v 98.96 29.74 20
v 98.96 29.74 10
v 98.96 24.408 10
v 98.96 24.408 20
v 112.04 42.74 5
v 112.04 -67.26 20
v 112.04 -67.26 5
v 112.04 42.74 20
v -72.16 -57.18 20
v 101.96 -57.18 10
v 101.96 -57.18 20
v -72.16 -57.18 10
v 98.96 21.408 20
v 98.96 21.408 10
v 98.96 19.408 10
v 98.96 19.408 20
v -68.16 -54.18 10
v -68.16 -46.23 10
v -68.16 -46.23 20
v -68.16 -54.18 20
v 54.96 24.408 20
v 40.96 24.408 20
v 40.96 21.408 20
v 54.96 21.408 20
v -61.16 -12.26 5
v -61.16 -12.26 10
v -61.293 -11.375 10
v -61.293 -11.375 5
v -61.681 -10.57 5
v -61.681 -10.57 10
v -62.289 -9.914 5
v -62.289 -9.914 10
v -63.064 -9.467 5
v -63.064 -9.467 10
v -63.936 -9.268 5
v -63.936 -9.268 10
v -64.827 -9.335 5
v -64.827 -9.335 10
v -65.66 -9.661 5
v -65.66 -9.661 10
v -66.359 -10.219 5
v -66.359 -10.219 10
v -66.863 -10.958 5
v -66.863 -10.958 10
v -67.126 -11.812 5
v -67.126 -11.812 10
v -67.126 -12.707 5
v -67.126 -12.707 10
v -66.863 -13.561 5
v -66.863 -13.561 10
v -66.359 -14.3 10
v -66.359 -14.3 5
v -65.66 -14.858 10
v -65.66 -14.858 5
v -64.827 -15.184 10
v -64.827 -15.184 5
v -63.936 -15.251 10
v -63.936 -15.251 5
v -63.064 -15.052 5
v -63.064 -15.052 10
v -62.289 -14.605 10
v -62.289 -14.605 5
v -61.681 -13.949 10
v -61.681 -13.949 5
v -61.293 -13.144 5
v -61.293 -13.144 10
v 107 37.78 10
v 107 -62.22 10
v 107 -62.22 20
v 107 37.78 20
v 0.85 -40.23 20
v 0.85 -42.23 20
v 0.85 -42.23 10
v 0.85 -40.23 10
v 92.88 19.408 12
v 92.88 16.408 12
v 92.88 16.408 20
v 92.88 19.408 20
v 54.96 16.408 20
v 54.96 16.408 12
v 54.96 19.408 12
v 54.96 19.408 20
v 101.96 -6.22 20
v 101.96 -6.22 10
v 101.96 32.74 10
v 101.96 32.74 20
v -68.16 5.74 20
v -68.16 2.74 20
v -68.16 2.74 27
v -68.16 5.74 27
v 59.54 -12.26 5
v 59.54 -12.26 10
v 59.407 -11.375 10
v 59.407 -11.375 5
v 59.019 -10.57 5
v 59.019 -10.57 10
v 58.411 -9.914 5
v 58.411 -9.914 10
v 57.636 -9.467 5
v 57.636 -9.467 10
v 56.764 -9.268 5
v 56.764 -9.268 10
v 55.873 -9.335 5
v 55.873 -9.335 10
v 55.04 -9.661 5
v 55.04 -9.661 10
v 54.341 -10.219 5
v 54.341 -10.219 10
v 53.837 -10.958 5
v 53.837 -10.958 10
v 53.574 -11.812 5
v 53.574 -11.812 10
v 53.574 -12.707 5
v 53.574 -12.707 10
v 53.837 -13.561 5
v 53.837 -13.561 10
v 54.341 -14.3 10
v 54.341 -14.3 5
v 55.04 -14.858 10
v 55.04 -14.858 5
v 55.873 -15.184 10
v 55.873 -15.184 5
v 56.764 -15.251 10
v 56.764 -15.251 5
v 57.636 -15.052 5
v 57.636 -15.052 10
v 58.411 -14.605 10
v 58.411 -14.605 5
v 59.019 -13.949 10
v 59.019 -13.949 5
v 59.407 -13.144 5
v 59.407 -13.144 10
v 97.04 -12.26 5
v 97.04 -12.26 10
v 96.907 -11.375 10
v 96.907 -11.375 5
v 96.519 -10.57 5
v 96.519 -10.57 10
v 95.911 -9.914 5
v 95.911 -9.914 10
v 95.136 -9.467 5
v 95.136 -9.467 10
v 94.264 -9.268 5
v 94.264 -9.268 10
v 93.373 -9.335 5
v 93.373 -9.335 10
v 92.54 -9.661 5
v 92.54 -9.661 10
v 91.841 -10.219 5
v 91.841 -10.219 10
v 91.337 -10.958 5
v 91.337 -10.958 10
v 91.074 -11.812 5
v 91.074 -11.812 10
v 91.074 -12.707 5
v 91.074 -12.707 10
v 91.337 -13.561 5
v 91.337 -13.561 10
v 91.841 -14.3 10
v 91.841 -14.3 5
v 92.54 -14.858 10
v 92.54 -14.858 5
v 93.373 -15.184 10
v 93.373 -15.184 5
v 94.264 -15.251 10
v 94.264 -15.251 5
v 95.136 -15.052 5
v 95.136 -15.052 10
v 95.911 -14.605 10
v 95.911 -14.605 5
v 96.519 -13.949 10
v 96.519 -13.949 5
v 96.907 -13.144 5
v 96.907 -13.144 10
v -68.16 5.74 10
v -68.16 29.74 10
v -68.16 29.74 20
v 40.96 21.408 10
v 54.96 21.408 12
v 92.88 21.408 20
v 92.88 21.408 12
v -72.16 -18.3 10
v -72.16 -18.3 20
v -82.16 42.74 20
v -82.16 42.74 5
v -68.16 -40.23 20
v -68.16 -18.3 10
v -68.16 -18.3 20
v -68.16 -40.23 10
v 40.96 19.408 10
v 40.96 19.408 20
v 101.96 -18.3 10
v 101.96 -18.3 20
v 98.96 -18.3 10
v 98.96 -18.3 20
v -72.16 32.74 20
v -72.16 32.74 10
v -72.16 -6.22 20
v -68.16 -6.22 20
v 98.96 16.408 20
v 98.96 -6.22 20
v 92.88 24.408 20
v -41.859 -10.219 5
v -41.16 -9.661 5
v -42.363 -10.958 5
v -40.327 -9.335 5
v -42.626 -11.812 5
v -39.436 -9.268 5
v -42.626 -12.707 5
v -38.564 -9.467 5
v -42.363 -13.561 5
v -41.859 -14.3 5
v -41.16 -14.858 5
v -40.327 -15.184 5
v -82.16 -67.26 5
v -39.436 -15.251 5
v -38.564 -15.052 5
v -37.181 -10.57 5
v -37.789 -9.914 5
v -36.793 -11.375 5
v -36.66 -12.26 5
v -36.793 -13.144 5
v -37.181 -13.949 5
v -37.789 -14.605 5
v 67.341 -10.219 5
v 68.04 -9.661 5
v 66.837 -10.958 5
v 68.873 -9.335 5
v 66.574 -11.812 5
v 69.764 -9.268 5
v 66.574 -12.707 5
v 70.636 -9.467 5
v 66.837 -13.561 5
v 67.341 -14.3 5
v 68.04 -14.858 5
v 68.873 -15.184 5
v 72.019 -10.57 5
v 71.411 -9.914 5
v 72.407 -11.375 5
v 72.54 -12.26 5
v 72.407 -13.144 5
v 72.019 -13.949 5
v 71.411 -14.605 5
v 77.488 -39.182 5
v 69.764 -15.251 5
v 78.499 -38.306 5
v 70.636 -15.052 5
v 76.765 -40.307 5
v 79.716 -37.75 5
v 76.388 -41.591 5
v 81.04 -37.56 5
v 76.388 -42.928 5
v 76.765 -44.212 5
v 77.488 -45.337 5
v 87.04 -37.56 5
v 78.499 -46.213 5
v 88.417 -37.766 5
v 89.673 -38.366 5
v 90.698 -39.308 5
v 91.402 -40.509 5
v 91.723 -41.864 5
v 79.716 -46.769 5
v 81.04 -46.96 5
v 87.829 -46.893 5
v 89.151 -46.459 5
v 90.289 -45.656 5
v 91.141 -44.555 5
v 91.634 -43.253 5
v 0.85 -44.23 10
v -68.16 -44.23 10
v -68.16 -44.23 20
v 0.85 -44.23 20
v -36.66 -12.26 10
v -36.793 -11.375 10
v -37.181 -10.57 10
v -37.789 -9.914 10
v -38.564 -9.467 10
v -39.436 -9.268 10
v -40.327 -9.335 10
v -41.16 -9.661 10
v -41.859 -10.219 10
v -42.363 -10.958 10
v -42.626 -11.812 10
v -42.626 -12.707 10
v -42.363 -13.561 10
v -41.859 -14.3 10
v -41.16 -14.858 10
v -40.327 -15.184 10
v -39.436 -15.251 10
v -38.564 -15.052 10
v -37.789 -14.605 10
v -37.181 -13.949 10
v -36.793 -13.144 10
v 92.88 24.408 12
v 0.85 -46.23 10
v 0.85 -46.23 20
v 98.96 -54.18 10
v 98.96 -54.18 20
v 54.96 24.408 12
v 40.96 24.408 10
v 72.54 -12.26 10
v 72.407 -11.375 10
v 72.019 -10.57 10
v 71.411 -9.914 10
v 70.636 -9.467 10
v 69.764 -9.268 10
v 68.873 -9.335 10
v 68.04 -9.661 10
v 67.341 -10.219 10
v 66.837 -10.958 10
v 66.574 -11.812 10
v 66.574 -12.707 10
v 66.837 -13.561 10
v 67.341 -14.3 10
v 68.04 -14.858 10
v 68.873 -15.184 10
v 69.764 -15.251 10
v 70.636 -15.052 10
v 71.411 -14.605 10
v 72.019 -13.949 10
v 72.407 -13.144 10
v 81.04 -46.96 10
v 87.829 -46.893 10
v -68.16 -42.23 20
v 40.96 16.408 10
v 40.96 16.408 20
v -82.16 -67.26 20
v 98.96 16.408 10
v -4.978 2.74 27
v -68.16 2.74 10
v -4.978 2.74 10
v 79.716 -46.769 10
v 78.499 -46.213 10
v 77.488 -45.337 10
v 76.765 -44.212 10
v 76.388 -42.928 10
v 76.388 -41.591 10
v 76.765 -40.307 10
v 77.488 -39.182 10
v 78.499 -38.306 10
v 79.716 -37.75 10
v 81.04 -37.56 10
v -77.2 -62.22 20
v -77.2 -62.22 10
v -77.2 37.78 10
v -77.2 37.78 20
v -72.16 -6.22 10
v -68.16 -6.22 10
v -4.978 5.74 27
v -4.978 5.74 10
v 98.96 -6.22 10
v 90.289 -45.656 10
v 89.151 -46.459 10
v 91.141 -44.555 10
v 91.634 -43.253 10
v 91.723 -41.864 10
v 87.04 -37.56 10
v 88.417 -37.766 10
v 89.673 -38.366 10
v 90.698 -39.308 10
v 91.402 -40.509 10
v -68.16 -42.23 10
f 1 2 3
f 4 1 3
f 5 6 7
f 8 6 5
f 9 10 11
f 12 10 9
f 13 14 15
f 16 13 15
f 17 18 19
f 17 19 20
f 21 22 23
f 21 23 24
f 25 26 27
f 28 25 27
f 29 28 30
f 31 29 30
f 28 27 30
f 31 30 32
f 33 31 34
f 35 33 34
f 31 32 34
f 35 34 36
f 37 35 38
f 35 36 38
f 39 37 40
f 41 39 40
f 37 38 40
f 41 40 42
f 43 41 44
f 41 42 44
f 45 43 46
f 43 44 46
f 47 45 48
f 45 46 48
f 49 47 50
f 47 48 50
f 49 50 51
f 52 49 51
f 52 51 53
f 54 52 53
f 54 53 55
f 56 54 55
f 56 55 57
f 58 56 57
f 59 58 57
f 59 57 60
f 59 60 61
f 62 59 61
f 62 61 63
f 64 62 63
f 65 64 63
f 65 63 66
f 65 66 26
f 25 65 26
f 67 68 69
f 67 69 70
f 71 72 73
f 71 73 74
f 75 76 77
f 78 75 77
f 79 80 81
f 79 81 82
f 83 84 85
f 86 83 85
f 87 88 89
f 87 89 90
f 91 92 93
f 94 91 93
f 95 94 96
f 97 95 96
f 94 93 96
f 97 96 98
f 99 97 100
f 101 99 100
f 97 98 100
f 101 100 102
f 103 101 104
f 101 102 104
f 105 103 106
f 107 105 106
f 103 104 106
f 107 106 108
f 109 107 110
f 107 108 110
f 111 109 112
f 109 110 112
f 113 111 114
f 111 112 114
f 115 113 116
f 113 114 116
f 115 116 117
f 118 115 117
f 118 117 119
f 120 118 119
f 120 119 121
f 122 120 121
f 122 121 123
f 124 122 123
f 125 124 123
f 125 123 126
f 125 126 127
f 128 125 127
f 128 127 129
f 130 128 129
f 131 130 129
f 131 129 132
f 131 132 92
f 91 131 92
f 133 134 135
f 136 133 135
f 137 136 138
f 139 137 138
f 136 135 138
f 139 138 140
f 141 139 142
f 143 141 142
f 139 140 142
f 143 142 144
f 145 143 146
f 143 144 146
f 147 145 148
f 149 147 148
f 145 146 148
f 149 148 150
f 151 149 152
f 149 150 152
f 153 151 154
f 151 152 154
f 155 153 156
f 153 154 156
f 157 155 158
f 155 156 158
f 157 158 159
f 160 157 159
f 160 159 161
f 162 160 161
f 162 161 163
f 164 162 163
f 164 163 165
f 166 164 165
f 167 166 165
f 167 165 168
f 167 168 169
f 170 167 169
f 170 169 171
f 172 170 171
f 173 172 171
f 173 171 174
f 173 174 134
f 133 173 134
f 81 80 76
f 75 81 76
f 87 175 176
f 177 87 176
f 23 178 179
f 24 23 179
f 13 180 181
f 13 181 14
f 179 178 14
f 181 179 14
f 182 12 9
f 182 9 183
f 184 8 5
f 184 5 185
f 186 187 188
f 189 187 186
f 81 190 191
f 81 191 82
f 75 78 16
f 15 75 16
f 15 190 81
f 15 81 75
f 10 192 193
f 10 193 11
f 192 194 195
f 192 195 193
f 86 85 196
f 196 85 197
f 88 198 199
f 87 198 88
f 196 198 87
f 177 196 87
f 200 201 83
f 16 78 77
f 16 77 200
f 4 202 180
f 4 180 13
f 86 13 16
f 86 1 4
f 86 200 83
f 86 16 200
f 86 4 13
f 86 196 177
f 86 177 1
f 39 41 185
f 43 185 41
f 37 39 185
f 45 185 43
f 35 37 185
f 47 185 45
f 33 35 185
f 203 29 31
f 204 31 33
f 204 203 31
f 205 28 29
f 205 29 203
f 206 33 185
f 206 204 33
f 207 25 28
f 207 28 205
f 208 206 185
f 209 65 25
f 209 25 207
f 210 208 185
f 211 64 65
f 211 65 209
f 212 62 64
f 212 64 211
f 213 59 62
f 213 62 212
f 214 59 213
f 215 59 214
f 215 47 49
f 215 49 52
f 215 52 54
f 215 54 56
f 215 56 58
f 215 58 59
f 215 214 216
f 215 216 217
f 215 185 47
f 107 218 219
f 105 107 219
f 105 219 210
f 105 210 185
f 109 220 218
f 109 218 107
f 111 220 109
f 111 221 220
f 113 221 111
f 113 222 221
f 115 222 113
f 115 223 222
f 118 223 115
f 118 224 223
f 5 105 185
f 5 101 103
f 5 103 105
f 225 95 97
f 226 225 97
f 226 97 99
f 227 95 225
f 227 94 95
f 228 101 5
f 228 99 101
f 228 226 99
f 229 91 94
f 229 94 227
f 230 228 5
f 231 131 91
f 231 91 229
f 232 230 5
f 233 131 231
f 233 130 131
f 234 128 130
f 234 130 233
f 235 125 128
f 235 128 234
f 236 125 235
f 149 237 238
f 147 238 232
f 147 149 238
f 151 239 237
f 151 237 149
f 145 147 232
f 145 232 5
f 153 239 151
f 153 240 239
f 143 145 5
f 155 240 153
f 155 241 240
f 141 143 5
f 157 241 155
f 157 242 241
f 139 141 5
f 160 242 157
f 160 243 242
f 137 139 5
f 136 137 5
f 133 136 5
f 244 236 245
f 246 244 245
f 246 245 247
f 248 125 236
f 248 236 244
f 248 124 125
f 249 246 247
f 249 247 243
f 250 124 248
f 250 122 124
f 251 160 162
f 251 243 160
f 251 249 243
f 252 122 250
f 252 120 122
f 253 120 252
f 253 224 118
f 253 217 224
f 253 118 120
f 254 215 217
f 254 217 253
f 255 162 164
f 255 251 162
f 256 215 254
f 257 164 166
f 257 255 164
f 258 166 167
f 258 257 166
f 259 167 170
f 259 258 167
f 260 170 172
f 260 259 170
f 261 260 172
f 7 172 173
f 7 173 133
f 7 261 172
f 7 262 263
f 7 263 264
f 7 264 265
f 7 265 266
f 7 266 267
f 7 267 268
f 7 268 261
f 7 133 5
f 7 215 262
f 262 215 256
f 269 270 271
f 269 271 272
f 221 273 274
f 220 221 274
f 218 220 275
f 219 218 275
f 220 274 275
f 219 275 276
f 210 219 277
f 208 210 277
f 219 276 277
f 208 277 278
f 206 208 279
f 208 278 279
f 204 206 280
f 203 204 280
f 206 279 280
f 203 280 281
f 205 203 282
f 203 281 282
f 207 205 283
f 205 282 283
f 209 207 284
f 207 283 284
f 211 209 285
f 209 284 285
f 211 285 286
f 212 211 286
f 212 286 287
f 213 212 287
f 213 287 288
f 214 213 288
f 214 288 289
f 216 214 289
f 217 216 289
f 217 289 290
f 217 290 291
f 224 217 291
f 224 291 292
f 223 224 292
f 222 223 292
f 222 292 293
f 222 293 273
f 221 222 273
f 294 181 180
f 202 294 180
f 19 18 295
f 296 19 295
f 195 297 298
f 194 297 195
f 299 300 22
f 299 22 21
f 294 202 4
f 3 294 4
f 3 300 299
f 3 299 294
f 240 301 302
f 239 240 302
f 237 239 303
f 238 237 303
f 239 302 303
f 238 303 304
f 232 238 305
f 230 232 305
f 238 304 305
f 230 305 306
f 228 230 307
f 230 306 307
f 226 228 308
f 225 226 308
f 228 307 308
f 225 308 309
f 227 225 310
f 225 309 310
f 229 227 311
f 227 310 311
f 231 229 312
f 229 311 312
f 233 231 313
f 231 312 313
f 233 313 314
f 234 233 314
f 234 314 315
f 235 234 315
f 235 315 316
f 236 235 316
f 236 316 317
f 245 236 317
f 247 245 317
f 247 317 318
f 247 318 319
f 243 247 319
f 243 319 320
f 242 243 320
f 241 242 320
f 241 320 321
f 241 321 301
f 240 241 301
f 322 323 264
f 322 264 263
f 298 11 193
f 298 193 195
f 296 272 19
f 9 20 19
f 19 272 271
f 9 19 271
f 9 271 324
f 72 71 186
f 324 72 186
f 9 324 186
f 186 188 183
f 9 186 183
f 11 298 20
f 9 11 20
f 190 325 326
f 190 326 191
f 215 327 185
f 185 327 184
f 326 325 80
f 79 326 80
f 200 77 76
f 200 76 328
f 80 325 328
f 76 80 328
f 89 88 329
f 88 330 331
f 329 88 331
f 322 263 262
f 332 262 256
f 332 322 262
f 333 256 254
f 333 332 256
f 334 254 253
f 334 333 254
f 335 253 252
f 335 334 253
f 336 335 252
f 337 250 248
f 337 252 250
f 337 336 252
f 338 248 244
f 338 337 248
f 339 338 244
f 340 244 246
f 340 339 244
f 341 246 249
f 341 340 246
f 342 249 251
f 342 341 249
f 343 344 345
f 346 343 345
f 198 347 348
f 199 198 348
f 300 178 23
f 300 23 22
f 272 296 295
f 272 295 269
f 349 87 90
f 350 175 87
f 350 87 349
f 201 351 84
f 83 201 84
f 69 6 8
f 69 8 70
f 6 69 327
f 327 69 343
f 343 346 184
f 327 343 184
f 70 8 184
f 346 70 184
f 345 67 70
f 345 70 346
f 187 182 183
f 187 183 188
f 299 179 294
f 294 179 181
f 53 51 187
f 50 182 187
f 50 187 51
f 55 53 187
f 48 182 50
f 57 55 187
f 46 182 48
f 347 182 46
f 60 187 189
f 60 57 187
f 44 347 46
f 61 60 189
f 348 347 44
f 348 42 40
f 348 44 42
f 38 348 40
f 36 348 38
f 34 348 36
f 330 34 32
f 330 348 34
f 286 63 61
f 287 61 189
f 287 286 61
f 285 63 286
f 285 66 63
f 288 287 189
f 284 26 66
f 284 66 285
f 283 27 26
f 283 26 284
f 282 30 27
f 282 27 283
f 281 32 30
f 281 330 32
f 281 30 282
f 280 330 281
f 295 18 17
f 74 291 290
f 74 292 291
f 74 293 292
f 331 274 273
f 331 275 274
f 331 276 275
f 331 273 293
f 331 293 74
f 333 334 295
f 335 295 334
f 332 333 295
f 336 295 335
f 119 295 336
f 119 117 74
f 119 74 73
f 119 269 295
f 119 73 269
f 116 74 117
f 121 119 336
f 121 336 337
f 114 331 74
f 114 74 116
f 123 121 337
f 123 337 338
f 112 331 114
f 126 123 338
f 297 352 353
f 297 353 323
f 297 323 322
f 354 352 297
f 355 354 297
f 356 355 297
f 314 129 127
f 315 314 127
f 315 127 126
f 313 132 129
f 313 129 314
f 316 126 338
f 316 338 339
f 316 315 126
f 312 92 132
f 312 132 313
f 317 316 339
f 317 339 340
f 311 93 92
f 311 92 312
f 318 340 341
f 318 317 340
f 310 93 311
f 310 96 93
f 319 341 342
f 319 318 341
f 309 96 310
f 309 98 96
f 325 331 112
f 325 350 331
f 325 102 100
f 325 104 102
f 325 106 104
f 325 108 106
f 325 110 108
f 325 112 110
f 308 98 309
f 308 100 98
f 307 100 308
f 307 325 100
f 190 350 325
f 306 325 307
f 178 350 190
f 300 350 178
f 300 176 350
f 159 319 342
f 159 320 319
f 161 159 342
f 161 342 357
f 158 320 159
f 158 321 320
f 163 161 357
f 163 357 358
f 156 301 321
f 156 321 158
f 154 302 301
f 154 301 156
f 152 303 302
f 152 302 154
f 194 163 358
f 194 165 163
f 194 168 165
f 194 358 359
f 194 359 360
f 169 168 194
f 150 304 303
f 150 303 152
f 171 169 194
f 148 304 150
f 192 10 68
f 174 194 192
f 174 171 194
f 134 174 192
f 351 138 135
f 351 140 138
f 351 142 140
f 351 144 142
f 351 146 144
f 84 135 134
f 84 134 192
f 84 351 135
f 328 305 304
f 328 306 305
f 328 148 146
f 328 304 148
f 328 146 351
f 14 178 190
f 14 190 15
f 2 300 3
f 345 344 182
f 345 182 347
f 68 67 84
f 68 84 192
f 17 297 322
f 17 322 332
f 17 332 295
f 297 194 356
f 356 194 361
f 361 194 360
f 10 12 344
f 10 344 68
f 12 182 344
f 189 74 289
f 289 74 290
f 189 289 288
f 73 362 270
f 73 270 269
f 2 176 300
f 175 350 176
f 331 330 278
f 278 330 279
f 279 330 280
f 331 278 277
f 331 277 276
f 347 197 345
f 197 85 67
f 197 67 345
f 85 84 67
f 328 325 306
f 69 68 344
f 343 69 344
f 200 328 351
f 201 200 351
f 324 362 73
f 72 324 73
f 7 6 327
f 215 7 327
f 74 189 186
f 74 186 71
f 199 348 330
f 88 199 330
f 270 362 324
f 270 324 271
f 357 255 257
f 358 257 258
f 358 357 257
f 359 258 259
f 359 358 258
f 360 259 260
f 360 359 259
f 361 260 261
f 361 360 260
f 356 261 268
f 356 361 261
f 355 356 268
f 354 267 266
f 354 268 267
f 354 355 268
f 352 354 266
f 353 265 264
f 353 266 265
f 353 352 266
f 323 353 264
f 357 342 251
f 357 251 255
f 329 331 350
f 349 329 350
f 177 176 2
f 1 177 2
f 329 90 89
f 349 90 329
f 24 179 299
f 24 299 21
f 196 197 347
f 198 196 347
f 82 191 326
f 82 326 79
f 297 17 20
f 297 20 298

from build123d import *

# Parameters (mm, degrees)
ESBO_O1_W                = 174.2
ESBO_O1_H                = 90
RESSALTO_EXTRUS_O1_DEPTH = 10
ESBO_O2_W                = 194.2
ESBO_O2_H                = 110
ESBO_O2_W_2              = 184.2
ESBO_O2_H_2              = 100
RESSALTO_EXTRUS_O2_DEPTH = 20
ESBO_O3_W                = 194.2
ESBO_O3_H                = 110
RESSALTO_EXTRUS_O3_DEPTH = 5
ESBO_O5_R                = 3
CORTE_EXTRUS_O1_DEPTH    = 20
ESBO_O6_W                = 63.181422492
ESBO_O6_H                = 3
RESSALTO_EXTRUS_O4_DEPTH = 17
ESBO_O7_W                = 70
ESBO_O7_H                = 2
ESBO_O7_W_2              = 58
ESBO_O7_H_2              = 3
RESSALTO_EXTRUS_O5_DEPTH = 10
ESBO_O10_W               = 37.92
ESBO_O10_H               = 15
CORTE_EXTRUS_O2_DEPTH    = 75
CORTE_EXTRUS_O3_DEPTH    = 20
ESBO_O13_W               = 184.2
ESBO_O13_H               = 100
ESBO_O13_W_2             = 174.2
ESBO_O13_H_2             = 90
RESSALTO_EXTRUS_O6_DEPTH = 10
RESSALTO_EXTRUS_O7_DEPTH = 10
ESBO_O17_W               = 194.2
ESBO_O17_H               = 10
CORTE_EXTRUS_O5_DEPTH    = 200


with BuildPart() as part:
    # Esboço1 → Ressalto-extrusão1 (new body)
    with BuildSketch(Plane.XY):
        with Locations((14.940102366, -12.259532062)):
            Rectangle(ESBO_O1_W, ESBO_O1_H)
    extrude(amount=RESSALTO_EXTRUS_O1_DEPTH)



with BuildPart() as body_2:
    # Esboço2 → Ressalto-extrusão2 (new body)
    with BuildSketch(Plane(origin=(0, 0, 0), x_dir=(-1, 0, 0), z_dir=(0, 0, -1))):
        with Locations((-14.940102366, -12.259532062)):
            Rectangle(ESBO_O2_W, ESBO_O2_H)
        with Locations((-14.900102366, -12.219532062)):
            Rectangle(ESBO_O2_W_2, ESBO_O2_H_2, mode=Mode.SUBTRACT)
    extrude(amount=-RESSALTO_EXTRUS_O2_DEPTH)


with BuildPart() as part_1:
    add(part.part)

    add(body_2.part)  # Ressalto-extrusão3 merges body 2
    # Esboço3 → Ressalto-extrusão3 (add)
    with BuildSketch(Plane(origin=(0, 0, 0), x_dir=(-1, 0, 0), z_dir=(0, 0, -1))):
        with Locations((-14.940102366, -12.259532062)):
            Rectangle(ESBO_O3_W, ESBO_O3_H)
    extrude(amount=RESSALTO_EXTRUS_O3_DEPTH)

    # Esboço5 → Corte-extrusão1 (cut)
    with BuildSketch(Plane.XY.offset(10)):
        with Locations((-64.159897634, -12.259532062)):
            Circle(ESBO_O5_R)
        with Locations((94.040102366, -12.259532062)):
            Circle(ESBO_O5_R)
        with Locations((-39.659897634, -12.259532062)):
            Circle(ESBO_O5_R)
        with Locations((69.540102366, -12.259532062)):
            Circle(ESBO_O5_R)
        with Locations((56.540102366, -12.259532062)):
            Circle(ESBO_O5_R)
    extrude(amount=-CORTE_EXTRUS_O1_DEPTH, mode=Mode.SUBTRACT)

    # Esboço6 → Ressalto-extrusão4 (add)
    with BuildSketch(Plane.XY.offset(10)):
        with Locations((-36.569186388, 4.240467938)):
            Rectangle(ESBO_O6_W, ESBO_O6_H)
    extrude(amount=RESSALTO_EXTRUS_O4_DEPTH)

    # Esboço7 → Ressalto-extrusão5 (add)
    with BuildSketch(Plane.XY.offset(10)):
        with Locations((-34.149897634, -41.229786606)):
            Rectangle(ESBO_O7_W, ESBO_O7_H)
        with Locations((-34.149897634, -45.229786606)):
            Rectangle(ESBO_O7_W, ESBO_O7_H)
        with Locations((69.960102366, 17.908396253)):
            Rectangle(ESBO_O7_W_2, ESBO_O7_H_2)
        with Locations((69.960102366, 22.908396253)):
            Rectangle(ESBO_O7_W_2, ESBO_O7_H_2)
    extrude(amount=RESSALTO_EXTRUS_O5_DEPTH)

    # Esboço10 → Corte-extrusão2 (cut)
    with BuildSketch(Plane.XZ.offset(46.229786606)):
        with Locations((73.920102366, 19.5)):
            Rectangle(ESBO_O10_W, ESBO_O10_H)
    extrude(amount=-CORTE_EXTRUS_O2_DEPTH, mode=Mode.SUBTRACT)

    # Esboço11 → Corte-extrusão3 (cut)
    with BuildSketch(Plane.XY.offset(10)):
        with BuildLine():
            Line((81.040102366, -37.559532062), (87.040102366, -37.559532062))
            ThreePointArc((87.040102366, -37.559532062), (91.723412608, -41.863798339), (87.828759302, -46.89289156))
            Line((87.828759302, -46.89289156), (81.040102366, -46.959532062))
            ThreePointArc((81.040102366, -46.959532062), (76.340102366, -42.259532062), (81.040102366, -37.559532062))
        make_face()
    extrude(amount=-CORTE_EXTRUS_O3_DEPTH, mode=Mode.SUBTRACT)

    # Esboço13 → Ressalto-extrusão6 (add)
    with BuildSketch(Plane.XY):
        with Locations((14.900102366, -12.219532062)):
            Rectangle(ESBO_O13_W, ESBO_O13_H)
        with Locations((14.940102366, -12.259532062)):
            Rectangle(ESBO_O13_W_2, ESBO_O13_H_2, mode=Mode.SUBTRACT)
    extrude(amount=RESSALTO_EXTRUS_O6_DEPTH)

    # Esboço14 → Ressalto-extrusão7 (add)
    with BuildSketch(Plane.XY.offset(10)):
        Polygon((101.960102366, -57.179532062), (-72.159897634, -57.179532062), (-72.159897634, -18.299532062), (-68.159897634, -18.299532062), (-68.159897634, -54.179532062), (98.960102366, -54.179532062), (98.960102366, -18.299532062), (101.960102366, -18.299532062), align=None)
        Polygon((101.960102366, 32.740467938), (-72.159897634, 32.740467938), (-72.159897634, -6.219532062), (-68.159897634, -6.219532062), (-68.159897634, 29.740467938), (98.960102366, 29.740467938), (98.960102366, -6.219532062), (101.960102366, -6.219532062), align=None)
    extrude(amount=RESSALTO_EXTRUS_O7_DEPTH)

    # Esboço17 → Corte-extrusão5 (cut)
    with BuildSketch(Plane.XZ.offset(67.259532062)):
        with Locations((14.940102366, 0)):
            Rectangle(ESBO_O17_W, ESBO_O17_H)
    extrude(amount=-CORTE_EXTRUS_O5_DEPTH, mode=Mode.SUBTRACT)


solid = part_1.part
